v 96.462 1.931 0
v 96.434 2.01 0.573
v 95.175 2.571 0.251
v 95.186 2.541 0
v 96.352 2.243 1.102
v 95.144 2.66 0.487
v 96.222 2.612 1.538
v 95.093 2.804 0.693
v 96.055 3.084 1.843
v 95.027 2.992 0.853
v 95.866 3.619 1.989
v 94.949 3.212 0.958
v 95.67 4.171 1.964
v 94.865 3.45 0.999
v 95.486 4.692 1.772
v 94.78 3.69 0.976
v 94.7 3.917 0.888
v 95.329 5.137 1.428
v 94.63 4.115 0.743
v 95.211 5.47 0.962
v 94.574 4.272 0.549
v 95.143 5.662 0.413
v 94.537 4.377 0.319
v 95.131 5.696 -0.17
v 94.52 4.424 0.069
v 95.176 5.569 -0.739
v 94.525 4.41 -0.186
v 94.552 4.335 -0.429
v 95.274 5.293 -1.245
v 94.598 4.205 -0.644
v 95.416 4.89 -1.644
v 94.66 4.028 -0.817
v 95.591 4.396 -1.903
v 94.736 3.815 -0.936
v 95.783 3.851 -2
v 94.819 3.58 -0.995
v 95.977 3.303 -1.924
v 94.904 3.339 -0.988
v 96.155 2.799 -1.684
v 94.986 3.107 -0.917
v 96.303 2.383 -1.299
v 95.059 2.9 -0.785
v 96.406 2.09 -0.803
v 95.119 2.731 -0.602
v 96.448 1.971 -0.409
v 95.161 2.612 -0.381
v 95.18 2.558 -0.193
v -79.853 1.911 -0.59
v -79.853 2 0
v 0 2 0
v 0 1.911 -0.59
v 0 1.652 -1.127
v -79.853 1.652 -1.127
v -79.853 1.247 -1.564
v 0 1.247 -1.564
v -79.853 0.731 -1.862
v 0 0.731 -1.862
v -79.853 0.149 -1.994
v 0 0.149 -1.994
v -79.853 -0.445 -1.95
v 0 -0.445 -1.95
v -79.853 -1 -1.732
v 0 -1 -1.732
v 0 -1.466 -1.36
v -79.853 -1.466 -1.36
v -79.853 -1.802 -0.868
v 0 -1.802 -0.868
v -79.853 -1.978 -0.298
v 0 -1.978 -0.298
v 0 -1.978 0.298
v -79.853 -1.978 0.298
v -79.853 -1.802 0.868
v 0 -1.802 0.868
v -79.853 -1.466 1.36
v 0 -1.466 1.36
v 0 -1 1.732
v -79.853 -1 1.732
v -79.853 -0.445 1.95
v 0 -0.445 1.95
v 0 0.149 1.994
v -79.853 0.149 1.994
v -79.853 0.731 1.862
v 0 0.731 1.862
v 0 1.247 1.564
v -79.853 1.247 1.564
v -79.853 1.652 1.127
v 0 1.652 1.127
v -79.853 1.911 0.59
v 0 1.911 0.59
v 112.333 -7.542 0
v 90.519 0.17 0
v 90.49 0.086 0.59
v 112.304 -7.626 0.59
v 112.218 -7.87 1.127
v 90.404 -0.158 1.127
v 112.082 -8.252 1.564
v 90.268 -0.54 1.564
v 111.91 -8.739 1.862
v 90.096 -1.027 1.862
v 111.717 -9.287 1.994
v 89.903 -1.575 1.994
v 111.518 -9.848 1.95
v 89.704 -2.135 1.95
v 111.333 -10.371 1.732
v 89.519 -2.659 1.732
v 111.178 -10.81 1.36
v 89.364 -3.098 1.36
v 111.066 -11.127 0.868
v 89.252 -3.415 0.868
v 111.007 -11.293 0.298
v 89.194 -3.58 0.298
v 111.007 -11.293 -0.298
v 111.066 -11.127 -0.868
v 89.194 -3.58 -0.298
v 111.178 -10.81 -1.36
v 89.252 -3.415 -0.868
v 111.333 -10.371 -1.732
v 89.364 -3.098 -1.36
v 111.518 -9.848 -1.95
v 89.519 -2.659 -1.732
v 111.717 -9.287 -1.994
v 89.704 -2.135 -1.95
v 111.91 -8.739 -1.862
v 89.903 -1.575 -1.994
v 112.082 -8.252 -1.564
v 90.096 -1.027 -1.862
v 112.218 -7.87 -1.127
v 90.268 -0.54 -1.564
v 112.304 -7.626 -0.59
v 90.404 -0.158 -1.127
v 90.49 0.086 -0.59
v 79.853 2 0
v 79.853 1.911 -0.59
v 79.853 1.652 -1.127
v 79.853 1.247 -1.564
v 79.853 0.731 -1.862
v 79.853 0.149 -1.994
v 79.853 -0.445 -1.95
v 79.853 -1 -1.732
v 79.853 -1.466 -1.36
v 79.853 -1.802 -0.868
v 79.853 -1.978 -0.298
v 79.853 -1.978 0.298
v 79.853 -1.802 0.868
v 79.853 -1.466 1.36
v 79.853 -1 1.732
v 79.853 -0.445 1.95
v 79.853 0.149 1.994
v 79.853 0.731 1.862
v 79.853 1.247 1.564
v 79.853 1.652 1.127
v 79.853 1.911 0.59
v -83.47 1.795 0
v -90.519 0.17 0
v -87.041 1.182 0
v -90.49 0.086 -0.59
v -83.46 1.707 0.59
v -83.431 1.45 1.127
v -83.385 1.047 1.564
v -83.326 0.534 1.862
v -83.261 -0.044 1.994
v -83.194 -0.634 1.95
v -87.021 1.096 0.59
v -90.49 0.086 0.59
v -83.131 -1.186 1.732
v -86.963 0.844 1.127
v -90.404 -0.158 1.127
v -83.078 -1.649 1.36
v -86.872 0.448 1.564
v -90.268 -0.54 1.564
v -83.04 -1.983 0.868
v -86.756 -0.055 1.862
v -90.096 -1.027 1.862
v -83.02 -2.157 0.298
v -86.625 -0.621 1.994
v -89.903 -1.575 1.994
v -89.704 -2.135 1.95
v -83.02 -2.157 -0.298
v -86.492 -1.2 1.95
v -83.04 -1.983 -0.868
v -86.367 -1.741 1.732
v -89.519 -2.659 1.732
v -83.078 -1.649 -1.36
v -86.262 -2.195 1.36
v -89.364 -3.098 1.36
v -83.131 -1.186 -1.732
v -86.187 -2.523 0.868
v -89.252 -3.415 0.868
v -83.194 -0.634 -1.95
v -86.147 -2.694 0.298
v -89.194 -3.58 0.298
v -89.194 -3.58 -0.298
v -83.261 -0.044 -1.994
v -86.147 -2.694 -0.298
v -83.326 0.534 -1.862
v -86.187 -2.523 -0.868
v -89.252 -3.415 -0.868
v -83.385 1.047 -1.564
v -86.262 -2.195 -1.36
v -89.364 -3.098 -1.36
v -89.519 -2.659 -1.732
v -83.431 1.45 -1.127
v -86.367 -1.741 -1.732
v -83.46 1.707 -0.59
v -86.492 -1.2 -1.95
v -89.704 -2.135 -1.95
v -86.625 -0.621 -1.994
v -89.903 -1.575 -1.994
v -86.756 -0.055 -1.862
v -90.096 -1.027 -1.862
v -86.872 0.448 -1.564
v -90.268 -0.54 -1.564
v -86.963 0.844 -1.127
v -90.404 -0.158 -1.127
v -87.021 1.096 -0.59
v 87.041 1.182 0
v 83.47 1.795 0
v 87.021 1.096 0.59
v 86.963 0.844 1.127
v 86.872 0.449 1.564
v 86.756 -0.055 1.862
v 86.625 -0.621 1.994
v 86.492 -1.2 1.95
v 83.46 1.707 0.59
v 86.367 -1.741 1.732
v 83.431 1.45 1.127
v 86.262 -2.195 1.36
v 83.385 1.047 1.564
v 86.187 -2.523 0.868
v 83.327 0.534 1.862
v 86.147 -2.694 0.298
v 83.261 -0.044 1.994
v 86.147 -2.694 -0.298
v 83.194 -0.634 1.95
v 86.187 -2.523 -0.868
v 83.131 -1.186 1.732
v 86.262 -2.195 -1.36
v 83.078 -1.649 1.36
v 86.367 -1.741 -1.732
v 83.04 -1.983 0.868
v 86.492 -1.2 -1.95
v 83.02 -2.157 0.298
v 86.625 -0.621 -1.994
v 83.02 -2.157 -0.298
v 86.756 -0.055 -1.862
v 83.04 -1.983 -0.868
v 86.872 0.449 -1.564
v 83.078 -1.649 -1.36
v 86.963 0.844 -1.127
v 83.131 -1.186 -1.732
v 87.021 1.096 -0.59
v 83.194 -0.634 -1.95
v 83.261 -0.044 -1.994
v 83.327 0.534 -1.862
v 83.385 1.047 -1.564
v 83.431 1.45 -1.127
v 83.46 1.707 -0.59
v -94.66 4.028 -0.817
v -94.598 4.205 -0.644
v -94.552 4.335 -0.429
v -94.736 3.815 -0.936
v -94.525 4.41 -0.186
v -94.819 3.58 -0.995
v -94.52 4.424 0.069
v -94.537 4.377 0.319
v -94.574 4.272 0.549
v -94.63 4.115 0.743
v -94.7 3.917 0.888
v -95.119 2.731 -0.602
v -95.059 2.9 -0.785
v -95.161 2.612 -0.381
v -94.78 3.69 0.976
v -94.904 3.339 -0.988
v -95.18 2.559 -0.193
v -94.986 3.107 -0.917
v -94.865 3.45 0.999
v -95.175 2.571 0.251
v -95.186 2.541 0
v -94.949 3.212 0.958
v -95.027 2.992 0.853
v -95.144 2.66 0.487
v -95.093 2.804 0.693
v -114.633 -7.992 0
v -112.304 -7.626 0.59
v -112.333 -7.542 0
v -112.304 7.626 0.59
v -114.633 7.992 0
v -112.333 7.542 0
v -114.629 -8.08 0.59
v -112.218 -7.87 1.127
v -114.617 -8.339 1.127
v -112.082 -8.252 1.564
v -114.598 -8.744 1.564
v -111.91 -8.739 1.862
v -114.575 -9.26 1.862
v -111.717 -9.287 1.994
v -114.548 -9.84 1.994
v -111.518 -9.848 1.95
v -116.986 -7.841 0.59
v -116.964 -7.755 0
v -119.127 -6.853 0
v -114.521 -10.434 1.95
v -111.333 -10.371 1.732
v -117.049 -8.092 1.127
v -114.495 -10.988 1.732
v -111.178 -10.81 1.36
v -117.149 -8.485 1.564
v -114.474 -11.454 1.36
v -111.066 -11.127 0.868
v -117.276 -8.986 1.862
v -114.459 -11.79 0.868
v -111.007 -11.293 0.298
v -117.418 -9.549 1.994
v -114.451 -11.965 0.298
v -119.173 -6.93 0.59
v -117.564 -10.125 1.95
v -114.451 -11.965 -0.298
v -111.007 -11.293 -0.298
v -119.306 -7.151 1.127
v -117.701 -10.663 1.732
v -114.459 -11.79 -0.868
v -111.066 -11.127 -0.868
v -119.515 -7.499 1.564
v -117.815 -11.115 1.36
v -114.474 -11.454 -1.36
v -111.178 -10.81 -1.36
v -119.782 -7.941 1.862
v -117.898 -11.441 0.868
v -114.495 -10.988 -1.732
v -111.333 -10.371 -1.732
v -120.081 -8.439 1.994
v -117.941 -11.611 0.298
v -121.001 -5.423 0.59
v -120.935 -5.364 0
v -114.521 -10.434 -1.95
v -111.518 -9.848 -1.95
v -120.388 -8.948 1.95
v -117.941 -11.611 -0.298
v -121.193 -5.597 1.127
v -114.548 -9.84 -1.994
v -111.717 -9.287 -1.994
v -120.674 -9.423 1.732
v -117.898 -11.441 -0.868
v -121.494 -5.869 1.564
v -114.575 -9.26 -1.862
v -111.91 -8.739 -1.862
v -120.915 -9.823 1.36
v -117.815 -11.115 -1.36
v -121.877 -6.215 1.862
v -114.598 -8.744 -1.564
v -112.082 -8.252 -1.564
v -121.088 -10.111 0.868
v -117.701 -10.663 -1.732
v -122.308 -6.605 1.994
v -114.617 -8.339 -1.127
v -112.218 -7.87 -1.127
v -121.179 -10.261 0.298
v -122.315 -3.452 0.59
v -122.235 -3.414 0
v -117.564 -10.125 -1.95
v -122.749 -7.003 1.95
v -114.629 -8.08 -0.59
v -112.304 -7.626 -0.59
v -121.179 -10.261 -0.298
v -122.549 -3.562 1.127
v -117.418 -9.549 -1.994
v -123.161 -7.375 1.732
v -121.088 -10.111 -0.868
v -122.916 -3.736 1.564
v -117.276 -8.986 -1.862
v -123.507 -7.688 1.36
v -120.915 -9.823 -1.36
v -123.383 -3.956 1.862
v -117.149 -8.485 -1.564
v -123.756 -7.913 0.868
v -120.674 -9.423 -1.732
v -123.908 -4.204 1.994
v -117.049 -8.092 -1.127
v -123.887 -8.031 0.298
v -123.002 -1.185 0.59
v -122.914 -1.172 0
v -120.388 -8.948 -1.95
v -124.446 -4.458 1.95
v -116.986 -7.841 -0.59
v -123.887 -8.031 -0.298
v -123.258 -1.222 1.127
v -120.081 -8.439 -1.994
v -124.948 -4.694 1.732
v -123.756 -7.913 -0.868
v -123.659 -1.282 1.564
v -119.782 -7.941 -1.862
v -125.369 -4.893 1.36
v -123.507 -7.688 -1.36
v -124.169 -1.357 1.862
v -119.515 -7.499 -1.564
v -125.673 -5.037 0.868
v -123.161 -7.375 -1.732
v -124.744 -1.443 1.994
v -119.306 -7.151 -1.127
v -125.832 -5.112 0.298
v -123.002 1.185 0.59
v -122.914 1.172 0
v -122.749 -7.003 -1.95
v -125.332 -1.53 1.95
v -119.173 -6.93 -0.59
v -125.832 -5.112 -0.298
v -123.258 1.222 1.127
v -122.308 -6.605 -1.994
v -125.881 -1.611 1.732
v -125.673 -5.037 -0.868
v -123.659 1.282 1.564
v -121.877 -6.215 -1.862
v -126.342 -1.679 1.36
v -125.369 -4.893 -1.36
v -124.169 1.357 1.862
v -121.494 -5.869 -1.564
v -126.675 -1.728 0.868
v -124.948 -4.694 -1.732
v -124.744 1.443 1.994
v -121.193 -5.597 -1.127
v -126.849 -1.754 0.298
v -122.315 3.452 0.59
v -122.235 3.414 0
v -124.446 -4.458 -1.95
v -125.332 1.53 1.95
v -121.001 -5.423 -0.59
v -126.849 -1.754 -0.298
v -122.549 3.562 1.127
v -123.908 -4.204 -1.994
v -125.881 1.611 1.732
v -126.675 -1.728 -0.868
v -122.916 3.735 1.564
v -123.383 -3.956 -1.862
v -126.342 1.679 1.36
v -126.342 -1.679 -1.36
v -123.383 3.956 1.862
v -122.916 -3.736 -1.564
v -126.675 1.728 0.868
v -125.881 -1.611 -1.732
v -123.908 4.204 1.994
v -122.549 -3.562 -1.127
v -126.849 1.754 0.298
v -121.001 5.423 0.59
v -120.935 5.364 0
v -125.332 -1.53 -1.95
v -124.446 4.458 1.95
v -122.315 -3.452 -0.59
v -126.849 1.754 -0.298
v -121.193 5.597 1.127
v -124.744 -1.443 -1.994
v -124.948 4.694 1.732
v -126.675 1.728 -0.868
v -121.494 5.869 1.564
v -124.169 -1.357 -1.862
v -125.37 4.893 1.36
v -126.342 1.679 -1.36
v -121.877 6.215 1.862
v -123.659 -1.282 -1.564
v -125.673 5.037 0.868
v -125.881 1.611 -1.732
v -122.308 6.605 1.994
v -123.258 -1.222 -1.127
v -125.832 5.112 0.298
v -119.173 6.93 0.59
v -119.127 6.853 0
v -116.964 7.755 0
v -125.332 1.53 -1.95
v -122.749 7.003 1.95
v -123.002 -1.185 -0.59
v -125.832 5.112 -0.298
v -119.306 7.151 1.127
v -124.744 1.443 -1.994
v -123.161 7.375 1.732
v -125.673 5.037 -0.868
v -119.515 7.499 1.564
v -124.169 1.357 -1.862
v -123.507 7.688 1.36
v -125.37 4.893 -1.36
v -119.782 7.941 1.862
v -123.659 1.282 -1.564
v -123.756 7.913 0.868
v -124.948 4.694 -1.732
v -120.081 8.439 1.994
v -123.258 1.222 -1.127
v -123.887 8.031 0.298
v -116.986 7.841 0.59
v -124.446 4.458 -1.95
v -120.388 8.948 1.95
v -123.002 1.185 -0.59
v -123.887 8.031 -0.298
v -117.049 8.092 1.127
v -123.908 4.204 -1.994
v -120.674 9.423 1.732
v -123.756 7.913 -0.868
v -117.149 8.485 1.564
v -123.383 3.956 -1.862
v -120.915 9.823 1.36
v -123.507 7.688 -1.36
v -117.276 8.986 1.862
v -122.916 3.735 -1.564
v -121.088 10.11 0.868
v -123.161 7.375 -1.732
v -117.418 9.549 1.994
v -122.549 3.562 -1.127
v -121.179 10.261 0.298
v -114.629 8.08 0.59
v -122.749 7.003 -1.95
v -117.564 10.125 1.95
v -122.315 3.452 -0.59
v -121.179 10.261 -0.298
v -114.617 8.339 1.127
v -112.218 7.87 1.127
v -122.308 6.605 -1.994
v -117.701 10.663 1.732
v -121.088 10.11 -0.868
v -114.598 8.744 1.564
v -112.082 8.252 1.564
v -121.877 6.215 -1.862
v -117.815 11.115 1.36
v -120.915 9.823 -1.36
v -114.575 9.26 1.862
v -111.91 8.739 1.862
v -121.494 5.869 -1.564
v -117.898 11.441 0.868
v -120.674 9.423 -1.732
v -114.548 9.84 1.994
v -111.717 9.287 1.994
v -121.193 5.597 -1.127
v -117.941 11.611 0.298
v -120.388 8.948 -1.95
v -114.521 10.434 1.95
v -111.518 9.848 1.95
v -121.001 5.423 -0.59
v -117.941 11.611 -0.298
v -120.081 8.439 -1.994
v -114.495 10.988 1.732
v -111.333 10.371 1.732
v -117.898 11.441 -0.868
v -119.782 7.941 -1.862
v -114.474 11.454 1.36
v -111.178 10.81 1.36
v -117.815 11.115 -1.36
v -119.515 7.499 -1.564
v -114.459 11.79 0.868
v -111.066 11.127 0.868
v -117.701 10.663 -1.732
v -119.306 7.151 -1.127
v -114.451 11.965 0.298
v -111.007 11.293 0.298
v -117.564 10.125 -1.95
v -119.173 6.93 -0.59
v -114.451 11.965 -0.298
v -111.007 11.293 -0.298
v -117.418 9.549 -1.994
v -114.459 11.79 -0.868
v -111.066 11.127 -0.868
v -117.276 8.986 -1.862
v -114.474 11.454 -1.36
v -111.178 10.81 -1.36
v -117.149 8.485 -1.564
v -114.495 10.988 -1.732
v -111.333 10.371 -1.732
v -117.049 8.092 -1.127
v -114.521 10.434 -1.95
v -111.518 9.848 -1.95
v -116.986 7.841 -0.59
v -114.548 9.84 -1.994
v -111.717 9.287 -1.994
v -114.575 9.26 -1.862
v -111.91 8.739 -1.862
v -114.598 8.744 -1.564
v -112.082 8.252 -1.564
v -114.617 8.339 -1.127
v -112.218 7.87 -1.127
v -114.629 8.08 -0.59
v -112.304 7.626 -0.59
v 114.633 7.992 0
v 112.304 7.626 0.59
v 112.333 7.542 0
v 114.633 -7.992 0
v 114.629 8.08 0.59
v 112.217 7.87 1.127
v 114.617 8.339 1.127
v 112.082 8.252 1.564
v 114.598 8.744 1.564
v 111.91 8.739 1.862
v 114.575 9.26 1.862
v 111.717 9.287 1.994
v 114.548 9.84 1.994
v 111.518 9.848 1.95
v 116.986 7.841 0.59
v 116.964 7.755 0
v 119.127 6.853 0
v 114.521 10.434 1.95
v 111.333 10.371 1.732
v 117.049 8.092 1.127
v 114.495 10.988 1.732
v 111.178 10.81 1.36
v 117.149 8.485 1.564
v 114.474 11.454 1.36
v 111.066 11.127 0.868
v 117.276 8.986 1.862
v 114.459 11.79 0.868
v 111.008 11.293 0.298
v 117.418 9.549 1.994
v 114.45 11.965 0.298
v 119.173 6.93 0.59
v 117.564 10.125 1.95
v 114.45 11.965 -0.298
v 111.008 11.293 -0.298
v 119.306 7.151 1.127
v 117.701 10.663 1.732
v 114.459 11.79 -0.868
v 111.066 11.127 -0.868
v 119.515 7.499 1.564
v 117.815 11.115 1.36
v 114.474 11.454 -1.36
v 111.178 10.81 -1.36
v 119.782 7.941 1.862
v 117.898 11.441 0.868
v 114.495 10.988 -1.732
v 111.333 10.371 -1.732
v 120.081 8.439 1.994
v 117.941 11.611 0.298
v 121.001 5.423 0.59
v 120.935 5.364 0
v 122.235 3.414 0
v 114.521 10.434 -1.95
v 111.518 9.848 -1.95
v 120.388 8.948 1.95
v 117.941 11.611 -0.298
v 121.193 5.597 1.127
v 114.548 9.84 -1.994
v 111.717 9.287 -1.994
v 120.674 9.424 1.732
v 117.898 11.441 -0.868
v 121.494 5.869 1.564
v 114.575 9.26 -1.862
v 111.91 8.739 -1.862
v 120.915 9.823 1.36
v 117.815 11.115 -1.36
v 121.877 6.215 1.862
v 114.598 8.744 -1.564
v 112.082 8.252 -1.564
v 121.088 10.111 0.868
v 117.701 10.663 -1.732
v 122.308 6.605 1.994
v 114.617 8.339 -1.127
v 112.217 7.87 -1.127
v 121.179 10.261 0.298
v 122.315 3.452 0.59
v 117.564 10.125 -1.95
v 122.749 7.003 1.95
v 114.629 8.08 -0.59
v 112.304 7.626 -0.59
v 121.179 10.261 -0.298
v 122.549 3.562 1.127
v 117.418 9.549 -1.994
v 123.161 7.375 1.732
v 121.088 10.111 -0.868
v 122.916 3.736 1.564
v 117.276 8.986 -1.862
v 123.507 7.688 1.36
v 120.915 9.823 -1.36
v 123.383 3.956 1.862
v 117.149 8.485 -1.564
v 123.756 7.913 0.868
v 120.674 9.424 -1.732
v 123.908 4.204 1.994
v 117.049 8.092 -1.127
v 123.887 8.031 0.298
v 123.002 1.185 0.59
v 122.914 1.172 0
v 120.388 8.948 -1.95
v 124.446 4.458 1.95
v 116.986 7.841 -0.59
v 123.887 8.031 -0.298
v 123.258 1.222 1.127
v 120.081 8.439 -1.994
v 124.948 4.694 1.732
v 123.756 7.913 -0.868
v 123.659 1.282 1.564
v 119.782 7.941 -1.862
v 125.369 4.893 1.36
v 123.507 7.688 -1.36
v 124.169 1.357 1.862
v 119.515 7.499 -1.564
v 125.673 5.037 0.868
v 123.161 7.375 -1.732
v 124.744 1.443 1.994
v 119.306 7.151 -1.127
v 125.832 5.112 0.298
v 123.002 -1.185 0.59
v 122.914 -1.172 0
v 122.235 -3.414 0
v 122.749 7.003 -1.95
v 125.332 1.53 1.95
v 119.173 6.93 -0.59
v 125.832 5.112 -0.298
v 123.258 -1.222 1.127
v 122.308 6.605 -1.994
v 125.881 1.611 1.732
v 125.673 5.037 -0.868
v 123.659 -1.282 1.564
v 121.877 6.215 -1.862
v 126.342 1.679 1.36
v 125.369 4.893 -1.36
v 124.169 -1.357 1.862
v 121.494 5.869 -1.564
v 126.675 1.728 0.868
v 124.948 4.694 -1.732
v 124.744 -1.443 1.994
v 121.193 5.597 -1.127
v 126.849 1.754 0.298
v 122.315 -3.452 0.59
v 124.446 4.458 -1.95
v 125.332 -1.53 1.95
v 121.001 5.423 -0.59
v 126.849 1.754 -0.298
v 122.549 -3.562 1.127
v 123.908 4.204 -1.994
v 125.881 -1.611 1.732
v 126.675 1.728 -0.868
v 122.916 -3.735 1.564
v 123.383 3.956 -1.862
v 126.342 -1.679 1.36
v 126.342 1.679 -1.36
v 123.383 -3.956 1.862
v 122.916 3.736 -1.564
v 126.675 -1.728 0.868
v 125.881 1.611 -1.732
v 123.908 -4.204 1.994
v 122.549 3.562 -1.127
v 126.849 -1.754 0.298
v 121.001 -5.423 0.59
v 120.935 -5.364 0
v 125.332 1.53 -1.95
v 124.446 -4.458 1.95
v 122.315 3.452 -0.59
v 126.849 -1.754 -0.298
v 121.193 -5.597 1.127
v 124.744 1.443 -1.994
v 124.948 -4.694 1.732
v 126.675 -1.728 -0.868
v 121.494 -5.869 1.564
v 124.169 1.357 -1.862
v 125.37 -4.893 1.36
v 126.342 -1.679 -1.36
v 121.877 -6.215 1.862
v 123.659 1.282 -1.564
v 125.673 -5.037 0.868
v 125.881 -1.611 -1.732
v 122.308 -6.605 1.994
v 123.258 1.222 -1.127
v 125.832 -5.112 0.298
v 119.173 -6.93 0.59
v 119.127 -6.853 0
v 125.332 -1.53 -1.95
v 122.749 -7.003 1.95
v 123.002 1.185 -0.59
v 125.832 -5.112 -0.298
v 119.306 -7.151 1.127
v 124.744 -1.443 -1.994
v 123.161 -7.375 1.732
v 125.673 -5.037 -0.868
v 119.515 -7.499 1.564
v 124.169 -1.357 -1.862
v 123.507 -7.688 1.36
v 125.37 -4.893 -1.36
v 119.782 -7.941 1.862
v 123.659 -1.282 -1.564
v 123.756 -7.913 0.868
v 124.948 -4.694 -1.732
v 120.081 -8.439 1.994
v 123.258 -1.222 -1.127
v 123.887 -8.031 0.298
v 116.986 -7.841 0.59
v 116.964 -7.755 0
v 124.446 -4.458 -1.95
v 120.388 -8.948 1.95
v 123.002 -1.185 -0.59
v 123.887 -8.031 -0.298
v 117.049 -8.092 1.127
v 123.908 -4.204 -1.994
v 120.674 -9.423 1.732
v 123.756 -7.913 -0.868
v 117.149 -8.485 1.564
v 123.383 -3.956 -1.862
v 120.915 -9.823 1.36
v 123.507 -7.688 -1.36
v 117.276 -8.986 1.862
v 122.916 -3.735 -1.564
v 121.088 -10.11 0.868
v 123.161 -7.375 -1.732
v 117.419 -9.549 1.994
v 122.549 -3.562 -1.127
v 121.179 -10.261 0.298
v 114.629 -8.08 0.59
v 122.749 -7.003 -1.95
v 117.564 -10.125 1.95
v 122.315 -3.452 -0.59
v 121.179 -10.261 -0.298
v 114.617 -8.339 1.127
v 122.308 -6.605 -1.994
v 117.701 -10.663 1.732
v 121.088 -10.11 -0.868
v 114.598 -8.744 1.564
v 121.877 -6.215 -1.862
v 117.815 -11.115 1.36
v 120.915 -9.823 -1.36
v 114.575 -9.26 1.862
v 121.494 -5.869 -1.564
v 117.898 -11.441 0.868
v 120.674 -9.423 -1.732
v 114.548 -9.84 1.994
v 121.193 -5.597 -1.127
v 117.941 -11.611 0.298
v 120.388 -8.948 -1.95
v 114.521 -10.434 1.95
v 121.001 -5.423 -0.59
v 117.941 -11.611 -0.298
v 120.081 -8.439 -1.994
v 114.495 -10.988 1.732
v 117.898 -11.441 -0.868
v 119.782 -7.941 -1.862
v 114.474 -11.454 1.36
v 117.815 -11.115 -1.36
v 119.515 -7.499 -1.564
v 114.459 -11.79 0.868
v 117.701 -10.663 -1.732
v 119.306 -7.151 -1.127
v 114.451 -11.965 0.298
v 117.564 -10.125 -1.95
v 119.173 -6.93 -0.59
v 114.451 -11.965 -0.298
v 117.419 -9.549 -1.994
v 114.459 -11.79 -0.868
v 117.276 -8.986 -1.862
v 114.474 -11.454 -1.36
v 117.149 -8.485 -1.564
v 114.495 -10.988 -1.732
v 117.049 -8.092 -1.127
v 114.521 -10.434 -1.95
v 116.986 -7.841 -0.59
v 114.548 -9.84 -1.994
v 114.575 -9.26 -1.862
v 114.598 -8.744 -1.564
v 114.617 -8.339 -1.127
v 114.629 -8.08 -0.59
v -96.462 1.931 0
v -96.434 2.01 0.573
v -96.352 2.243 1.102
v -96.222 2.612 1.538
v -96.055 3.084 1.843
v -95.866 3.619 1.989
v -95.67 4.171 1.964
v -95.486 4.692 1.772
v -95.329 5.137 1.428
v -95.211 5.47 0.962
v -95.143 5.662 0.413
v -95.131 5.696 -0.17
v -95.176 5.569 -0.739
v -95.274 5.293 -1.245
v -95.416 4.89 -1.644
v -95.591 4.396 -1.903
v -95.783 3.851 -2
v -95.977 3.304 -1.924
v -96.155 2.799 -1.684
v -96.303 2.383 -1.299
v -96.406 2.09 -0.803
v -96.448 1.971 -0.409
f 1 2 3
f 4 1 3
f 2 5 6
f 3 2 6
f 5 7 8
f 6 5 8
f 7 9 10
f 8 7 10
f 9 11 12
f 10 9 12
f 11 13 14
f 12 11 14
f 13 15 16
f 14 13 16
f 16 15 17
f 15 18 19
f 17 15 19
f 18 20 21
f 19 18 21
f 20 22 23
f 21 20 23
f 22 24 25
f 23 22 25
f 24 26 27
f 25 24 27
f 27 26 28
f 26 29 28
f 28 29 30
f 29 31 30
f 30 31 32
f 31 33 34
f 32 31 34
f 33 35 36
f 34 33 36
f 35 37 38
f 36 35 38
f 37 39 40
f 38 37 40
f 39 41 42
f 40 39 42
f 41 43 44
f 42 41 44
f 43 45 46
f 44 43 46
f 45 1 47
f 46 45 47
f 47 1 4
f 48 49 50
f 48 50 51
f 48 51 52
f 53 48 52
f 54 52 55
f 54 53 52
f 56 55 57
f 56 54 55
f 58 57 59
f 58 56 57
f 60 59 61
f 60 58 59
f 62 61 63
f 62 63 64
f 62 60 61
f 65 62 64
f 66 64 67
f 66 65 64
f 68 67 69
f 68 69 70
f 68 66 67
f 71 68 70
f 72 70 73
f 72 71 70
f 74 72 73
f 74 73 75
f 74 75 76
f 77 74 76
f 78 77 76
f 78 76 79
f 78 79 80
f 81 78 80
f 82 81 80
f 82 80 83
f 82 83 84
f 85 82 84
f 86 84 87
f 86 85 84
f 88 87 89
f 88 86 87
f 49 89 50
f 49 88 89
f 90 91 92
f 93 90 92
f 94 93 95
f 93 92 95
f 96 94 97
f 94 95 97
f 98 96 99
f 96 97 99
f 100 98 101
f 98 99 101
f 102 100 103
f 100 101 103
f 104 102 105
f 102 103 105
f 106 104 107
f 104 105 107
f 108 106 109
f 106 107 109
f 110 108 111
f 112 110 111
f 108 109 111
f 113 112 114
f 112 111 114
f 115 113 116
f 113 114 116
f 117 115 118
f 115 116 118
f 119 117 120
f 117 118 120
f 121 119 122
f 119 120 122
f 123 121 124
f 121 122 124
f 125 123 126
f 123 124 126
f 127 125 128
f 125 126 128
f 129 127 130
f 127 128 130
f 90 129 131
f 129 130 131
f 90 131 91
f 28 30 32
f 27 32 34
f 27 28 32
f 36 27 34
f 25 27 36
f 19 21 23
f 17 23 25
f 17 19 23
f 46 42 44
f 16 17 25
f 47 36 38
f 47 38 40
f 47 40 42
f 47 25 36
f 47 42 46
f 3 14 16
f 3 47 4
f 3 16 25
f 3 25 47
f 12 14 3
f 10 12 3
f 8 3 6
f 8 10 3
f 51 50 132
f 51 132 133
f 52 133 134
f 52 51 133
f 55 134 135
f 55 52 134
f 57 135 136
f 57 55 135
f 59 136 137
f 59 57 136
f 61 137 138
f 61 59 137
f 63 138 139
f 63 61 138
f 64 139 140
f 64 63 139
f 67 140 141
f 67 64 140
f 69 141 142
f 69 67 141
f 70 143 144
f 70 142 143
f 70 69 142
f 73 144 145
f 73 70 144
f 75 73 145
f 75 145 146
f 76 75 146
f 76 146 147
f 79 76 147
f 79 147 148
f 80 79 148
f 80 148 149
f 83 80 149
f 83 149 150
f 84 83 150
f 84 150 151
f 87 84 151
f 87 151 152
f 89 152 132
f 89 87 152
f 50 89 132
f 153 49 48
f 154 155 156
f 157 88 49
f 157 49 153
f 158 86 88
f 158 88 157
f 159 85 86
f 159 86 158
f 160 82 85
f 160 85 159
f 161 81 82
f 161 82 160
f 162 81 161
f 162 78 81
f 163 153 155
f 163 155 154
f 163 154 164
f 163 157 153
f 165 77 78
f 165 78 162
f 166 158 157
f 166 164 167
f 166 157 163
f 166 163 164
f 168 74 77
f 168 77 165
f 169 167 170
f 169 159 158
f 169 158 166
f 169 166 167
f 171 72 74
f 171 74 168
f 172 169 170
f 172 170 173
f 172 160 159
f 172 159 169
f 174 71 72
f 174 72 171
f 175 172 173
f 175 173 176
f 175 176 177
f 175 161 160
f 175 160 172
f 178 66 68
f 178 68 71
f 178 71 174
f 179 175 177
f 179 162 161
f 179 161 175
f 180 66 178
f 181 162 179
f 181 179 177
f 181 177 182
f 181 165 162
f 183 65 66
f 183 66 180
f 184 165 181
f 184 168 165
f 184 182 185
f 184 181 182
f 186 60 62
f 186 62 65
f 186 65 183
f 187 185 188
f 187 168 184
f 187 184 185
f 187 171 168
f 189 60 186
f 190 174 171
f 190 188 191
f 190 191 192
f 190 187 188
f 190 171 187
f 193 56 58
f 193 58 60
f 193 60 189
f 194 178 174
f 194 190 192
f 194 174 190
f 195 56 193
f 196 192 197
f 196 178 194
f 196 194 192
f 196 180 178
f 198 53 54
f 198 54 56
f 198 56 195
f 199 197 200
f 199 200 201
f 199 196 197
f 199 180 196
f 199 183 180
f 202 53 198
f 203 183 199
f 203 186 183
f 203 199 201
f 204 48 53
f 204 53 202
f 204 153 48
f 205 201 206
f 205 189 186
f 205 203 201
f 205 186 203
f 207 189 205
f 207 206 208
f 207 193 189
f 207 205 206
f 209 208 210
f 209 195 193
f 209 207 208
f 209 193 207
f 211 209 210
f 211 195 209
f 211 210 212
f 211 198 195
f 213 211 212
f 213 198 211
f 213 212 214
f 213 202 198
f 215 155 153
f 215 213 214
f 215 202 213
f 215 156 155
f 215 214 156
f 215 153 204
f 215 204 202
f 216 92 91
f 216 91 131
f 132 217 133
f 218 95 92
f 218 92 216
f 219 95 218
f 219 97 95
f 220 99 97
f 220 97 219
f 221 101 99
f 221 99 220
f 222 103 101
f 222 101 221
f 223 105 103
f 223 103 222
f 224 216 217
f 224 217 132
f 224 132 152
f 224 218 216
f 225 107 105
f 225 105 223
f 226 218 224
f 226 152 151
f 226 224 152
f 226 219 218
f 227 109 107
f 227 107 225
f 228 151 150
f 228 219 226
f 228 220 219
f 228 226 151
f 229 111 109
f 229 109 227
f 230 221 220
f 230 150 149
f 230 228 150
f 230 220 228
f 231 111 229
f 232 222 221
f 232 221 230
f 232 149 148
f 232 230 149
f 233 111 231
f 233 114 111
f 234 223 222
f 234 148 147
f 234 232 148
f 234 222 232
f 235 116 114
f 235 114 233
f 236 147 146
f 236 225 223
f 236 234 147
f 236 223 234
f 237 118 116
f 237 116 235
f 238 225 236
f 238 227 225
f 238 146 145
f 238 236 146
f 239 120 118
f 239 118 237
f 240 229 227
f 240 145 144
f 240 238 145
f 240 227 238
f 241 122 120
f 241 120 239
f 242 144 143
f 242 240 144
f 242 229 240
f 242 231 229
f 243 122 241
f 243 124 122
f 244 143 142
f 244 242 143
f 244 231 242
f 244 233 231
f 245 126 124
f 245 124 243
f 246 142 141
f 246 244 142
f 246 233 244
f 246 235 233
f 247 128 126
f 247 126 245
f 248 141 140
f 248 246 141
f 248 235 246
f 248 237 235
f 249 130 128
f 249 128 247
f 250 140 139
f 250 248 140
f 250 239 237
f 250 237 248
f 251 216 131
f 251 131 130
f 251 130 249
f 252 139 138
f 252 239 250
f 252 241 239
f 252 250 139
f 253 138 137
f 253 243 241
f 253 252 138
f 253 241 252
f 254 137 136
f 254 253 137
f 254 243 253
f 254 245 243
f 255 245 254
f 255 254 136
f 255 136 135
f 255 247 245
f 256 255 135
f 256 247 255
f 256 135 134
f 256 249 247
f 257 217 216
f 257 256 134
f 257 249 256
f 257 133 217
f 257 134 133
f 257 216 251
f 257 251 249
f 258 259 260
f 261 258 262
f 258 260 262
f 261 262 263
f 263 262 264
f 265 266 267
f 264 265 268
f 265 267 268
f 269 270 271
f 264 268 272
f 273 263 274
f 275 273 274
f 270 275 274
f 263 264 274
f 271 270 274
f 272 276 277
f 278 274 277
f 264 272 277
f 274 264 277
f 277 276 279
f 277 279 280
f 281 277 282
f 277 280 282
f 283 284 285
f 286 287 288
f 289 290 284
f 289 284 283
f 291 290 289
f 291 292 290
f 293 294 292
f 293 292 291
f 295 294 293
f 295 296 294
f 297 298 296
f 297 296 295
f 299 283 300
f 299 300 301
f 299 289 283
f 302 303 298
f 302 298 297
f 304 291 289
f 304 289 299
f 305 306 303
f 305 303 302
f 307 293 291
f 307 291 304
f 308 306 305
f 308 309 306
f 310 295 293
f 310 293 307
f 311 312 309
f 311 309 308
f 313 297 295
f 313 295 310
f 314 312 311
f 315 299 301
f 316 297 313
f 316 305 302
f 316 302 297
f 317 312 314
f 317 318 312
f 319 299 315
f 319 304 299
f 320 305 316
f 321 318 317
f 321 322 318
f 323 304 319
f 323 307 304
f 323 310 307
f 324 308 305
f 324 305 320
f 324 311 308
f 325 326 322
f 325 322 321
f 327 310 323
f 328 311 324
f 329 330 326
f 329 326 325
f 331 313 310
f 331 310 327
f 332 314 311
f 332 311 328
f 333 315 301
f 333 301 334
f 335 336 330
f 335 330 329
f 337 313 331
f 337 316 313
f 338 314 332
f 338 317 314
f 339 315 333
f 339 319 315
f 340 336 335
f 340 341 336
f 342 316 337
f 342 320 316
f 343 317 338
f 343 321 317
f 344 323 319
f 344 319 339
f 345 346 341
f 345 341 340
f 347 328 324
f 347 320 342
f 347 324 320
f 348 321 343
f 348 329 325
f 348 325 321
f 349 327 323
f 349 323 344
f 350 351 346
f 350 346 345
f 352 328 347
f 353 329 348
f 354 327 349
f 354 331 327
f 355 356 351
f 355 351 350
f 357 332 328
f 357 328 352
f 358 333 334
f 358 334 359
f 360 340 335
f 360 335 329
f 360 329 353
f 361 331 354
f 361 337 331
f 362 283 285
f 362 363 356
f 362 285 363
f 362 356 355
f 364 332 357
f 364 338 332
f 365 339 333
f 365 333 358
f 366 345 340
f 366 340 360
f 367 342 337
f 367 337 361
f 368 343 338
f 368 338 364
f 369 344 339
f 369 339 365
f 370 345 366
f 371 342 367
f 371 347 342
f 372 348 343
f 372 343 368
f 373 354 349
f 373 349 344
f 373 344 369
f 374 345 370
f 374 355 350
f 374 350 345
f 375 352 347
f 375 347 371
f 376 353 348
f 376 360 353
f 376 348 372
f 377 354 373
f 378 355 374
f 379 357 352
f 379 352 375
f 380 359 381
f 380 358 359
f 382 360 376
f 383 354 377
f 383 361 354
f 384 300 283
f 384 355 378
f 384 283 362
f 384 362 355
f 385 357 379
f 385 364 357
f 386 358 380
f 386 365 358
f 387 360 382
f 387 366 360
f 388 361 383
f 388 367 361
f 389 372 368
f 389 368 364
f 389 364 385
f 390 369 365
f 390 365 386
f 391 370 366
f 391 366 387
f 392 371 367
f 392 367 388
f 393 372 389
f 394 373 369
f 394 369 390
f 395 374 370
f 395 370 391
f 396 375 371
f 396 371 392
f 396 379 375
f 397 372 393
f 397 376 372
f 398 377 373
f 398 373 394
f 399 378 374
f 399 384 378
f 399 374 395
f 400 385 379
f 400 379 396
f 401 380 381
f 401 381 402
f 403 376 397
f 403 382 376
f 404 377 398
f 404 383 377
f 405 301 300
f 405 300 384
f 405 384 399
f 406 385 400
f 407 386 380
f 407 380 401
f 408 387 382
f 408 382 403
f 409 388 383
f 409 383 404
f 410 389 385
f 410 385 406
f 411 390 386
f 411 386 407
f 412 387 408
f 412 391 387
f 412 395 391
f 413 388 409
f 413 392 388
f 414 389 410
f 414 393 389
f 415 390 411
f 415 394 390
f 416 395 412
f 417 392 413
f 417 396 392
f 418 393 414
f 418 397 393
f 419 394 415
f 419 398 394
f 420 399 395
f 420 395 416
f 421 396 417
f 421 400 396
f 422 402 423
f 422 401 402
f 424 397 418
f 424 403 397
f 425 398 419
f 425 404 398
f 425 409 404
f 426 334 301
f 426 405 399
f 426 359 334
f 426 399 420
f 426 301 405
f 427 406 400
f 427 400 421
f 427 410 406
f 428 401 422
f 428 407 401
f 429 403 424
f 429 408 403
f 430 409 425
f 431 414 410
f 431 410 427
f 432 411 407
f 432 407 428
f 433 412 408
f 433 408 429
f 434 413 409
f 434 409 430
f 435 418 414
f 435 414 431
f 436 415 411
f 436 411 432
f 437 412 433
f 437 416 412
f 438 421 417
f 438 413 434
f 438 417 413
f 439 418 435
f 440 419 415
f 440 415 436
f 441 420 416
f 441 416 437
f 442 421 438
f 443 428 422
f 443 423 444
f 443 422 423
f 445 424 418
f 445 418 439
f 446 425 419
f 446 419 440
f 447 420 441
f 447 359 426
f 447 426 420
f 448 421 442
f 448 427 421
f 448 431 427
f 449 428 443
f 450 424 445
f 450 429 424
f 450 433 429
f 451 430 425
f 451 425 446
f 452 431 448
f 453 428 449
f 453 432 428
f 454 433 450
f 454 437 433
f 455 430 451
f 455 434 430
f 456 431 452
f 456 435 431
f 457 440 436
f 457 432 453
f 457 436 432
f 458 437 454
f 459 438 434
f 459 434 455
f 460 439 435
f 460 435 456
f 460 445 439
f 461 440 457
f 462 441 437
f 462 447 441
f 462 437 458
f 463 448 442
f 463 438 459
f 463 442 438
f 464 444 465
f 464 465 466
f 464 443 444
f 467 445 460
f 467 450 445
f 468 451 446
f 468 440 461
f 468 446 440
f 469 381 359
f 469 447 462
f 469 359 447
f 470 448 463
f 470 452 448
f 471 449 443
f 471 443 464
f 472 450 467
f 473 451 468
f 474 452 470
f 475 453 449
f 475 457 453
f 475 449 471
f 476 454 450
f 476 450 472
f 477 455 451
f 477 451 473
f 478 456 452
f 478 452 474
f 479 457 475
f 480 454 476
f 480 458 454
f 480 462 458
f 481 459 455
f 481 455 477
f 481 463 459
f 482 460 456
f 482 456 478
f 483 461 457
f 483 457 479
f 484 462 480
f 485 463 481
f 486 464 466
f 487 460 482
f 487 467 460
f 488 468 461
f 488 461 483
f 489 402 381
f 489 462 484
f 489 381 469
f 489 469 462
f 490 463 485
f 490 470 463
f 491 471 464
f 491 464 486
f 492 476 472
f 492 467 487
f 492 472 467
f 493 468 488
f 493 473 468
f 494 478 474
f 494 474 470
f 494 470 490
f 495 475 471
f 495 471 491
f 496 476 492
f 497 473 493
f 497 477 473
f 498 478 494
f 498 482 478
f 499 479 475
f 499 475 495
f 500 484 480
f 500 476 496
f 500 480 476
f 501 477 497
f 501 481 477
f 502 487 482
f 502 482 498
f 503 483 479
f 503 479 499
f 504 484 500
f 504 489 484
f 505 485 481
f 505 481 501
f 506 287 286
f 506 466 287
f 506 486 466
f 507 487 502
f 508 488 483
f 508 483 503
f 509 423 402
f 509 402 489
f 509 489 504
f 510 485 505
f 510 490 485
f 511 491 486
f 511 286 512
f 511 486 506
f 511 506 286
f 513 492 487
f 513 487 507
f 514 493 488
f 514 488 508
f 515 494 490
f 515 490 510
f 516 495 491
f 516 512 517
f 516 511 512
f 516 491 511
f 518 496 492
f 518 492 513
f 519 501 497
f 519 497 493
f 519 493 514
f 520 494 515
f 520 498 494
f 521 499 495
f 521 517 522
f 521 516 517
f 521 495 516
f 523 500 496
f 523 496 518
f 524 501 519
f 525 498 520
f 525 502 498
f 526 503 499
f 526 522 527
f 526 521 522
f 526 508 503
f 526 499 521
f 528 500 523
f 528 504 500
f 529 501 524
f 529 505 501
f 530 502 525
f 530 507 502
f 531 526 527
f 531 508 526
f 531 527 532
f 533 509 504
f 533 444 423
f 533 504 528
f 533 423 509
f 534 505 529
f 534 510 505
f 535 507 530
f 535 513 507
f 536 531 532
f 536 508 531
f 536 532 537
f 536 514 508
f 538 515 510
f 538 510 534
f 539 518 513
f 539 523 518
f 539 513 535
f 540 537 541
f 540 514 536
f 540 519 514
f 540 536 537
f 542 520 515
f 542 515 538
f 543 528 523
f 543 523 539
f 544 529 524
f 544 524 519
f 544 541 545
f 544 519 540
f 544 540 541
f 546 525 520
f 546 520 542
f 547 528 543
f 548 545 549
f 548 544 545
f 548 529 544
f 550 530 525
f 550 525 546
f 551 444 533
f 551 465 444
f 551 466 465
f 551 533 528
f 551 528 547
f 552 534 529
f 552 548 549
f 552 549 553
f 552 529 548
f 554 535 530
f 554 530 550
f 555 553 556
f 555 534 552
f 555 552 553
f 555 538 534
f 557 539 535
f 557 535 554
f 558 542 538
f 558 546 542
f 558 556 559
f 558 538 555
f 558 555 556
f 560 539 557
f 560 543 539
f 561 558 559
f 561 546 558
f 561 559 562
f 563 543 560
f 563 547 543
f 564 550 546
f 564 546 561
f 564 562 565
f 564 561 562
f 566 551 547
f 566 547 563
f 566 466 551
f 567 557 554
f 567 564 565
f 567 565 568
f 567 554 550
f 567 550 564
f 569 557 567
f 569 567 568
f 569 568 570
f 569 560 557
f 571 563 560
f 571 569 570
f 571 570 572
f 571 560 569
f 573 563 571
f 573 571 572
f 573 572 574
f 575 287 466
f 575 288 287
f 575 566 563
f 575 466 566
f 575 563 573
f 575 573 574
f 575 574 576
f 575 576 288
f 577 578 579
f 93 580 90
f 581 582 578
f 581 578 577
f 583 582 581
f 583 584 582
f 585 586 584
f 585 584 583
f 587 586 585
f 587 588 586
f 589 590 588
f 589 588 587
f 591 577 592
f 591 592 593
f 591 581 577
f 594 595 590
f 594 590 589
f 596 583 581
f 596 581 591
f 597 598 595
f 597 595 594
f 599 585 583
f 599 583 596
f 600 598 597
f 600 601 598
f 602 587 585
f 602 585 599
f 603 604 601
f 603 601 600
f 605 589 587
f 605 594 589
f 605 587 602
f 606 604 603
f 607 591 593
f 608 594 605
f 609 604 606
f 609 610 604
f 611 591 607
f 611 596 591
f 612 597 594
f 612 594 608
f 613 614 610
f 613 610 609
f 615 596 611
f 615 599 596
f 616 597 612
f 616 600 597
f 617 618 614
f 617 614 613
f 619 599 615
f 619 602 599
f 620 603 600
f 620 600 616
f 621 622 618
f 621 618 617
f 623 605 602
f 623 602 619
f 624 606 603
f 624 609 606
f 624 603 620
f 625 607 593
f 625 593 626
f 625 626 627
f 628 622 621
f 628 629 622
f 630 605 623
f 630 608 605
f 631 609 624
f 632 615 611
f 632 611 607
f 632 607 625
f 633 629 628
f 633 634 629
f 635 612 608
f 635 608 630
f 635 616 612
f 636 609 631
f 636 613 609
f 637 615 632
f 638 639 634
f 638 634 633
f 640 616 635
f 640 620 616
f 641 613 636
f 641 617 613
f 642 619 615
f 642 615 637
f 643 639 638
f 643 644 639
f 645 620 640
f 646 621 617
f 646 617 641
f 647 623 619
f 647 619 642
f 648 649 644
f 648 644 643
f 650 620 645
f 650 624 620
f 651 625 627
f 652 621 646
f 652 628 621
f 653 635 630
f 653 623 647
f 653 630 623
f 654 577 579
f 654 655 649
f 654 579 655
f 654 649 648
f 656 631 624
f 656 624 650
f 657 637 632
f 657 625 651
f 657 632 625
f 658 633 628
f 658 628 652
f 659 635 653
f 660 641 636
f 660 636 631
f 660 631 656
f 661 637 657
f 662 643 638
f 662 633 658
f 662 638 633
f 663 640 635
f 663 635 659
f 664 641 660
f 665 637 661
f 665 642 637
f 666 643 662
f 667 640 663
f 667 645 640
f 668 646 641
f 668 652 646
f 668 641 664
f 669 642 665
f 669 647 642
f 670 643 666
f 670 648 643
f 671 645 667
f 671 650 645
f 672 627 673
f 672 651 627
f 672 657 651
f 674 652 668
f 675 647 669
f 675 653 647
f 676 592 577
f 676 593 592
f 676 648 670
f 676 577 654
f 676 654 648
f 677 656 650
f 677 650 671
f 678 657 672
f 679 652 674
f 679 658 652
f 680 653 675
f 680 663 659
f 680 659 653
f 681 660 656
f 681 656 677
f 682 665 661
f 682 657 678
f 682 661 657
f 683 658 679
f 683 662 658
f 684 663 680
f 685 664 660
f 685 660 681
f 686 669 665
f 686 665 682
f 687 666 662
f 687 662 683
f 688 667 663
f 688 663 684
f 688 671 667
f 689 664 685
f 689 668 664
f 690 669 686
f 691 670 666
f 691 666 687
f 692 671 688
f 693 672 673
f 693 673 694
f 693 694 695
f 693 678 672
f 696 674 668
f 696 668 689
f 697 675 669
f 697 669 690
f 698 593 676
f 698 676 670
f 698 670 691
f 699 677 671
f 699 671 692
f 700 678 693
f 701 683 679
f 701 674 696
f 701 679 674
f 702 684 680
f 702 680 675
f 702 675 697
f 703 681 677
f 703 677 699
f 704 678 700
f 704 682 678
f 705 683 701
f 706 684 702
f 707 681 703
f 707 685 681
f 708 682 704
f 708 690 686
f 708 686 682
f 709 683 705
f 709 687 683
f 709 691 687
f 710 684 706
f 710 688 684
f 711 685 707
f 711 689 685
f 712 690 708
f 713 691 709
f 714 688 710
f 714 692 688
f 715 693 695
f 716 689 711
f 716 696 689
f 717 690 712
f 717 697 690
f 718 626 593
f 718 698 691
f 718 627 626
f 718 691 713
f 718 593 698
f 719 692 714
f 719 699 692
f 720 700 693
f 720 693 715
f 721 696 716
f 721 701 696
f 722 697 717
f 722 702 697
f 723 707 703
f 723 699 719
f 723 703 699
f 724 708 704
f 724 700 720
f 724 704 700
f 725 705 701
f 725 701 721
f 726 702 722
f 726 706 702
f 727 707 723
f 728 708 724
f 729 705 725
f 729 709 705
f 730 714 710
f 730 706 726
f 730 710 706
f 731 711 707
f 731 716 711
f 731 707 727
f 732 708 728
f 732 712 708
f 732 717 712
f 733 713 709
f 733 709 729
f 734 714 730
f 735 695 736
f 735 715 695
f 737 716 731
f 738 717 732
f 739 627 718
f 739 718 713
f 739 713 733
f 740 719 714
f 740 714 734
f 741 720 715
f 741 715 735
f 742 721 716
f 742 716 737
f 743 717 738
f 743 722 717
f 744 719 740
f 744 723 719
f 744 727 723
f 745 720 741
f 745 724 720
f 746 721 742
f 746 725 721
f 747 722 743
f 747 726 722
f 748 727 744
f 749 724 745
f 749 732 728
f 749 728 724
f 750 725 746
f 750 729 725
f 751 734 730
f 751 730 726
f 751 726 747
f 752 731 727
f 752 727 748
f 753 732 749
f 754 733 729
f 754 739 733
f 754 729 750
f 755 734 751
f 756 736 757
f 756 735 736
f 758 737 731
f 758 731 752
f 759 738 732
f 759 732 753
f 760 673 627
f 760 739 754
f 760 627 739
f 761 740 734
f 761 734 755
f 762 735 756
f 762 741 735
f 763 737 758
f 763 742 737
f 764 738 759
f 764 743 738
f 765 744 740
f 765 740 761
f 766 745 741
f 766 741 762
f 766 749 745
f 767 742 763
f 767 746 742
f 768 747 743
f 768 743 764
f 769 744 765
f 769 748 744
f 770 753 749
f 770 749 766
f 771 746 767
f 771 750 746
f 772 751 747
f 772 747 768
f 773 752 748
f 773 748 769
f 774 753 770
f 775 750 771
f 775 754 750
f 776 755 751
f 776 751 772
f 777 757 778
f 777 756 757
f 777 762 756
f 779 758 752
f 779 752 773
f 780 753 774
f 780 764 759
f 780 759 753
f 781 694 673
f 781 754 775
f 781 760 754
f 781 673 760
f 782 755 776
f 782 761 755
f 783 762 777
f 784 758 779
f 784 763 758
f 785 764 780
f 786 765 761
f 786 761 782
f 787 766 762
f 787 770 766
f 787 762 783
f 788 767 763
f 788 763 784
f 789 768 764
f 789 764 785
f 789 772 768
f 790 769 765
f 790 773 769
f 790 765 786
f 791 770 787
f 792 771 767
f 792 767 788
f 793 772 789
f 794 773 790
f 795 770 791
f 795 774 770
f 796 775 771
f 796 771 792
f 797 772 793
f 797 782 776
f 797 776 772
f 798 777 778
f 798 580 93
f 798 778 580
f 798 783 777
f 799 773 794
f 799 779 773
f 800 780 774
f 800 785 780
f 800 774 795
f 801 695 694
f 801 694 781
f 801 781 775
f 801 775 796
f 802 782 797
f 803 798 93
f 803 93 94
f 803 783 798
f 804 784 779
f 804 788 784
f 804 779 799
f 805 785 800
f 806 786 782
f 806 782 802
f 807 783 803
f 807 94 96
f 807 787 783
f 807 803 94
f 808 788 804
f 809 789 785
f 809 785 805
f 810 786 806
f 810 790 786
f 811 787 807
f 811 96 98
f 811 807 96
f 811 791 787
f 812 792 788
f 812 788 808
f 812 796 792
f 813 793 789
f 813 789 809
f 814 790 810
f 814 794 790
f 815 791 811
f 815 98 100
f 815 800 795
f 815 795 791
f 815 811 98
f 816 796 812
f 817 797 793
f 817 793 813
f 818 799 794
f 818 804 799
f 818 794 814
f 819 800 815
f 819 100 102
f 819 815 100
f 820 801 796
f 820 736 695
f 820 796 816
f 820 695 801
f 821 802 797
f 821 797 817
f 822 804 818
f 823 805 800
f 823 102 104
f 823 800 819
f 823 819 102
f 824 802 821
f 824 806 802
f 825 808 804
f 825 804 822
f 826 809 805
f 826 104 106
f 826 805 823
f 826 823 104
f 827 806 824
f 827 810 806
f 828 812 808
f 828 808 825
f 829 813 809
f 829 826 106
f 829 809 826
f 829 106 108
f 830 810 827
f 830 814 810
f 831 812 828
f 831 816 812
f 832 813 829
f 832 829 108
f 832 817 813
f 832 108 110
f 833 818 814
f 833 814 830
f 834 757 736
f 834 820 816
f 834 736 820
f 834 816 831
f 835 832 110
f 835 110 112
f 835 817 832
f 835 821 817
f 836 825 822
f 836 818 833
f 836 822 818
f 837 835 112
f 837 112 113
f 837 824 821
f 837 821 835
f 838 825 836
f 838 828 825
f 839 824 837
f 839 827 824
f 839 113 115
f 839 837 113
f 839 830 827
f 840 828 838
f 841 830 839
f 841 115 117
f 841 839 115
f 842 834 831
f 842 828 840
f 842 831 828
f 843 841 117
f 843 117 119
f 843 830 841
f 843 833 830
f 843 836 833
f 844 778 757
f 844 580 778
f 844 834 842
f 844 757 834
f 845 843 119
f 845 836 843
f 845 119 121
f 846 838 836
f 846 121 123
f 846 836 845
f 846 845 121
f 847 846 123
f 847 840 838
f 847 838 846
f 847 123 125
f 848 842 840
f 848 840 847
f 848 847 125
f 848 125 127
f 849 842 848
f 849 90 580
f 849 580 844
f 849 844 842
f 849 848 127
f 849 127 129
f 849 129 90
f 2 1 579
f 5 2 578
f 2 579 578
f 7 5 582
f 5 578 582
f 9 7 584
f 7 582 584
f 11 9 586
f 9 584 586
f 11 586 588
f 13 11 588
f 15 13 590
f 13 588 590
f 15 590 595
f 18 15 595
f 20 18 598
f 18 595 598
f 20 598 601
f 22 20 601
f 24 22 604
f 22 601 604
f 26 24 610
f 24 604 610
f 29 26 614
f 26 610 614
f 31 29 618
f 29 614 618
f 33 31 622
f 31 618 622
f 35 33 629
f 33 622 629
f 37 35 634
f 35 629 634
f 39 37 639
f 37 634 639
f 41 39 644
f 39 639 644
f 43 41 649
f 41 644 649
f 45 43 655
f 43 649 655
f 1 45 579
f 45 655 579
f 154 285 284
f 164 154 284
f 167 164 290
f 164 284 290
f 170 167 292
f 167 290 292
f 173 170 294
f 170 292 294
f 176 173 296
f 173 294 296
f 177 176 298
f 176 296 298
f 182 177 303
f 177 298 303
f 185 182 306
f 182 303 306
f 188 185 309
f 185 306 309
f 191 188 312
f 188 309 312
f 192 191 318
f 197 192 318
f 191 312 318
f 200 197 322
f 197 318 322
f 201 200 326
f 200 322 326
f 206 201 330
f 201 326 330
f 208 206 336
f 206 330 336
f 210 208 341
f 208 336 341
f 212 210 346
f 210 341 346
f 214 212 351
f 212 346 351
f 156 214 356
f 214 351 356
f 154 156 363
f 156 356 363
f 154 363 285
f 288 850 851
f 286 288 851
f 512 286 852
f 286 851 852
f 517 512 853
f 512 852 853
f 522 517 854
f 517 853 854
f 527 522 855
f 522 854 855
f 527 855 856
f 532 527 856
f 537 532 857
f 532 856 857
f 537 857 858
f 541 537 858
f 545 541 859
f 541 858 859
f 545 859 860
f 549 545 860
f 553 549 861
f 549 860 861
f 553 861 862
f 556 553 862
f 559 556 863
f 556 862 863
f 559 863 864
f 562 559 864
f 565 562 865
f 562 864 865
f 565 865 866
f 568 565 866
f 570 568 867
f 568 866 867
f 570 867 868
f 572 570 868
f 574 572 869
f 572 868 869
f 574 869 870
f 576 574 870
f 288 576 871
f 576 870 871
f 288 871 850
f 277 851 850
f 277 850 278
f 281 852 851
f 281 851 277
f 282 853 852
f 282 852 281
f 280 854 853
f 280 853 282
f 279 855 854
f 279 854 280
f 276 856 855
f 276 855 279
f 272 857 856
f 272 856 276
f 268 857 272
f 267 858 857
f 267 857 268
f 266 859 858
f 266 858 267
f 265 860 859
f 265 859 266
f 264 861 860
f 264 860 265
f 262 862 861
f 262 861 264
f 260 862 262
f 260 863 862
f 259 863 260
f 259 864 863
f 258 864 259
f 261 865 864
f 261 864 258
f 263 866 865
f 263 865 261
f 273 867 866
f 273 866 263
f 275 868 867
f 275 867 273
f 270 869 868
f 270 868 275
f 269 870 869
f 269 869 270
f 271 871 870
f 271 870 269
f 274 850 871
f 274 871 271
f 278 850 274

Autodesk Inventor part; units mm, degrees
ref_plane "YZ Plane" through (0, 0, 0) normal (1, 0, 0) x (0, 1, 0)
ref_plane "XZ Plane" through (0, 0, 0) normal (0, 1, 0) x (-1, 0, 0)
ref_plane "XY Plane" through (0, 0, 0) normal (0, 0, 1) x (1, 0, 0)
sketch "Sketch1" plane through (0, 0, 0) normal (0, 0, 1) x (1, 0, 0)
  line L0 (0, 0) -> (-79.8528, 0)
  line L1 (-89.8528, -1.7157) -> (-111.6667, -9.4281)
  arc A0 (-111.6667, 9.4281) -> (-111.6667, -9.4281) centre (-115, 0) ccw
  line L2 (-111.6667, 9.4281) -> (-94.8528, 3.4835)
  arc A1 (-79.8528, 0) -> (-89.8528, -1.7157) centre (-79.8528, -30) ccw
  line L3 (0, 0) -> (0, 44.256) construction
  line L4 (0, 0) -> (79.8528, 0)
  line L5 (89.8528, -1.7157) -> (111.6667, -9.4281)
  arc A2 (111.6667, -9.4281) -> (111.6667, 9.4281) centre (115, 0) ccw
  line L6 (111.6667, 9.4281) -> (94.8528, 3.4835)
  arc A3 (89.8528, -1.7157) -> (79.8528, 0) centre (79.8528, -30) ccw
  point P0 (-85, 0)
  point P1 (85, 0)
  dimension "d0" = 85
  dimension "d1" = 30
  dimension "d2" = 30
  dimension "d3" = 10
  dimension "d4" = 15
  dimension "d5" = 160.529
  dimension "d6" = 160.529
sketch "Sketch2" plane through (0, 0, 0) normal (1, 0, 0) x (0, 1, 0)
  circle A0 centre (0, 0) radius 2
  dimension "d7" = 4
sweep "Sweep1" add profiles "Sketch2" path "Sketch1"
chamfer "Chamfer1" distance 1 angle 45 11 edges at (94.1861, 5.3691, 0) (111, 11.3137, 0) (111, -11.3137, 0) (89.1861, -3.6013, 0) (79.8528, -2, 0) (0, -2, 0) (-79.8528, -2, 0) (-89.1861, -3.6013, 0) (-111, -11.3137, 0) (-111, 11.3137, 0) (-94.1861, 5.3691, 0)
equation "\"d6\" = d5"
properties part number "Rebar type 1" material "Steel"
